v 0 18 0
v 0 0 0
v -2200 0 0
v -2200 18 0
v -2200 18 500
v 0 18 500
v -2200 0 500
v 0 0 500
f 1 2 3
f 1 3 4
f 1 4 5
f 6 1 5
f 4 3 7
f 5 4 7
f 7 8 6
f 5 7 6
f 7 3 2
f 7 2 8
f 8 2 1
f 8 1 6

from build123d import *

# Parameters (mm, degrees)
F0_W     = 43.4928238392
F0_H     = 32.2236791253
F1_DEPTH = 18
F2_DEPTH = 2200
F3_DEPTH = 500


with BuildPart() as f1:
    # F0 (on Front) → F1 (new body)
    with BuildSketch(Plane.XZ):
        with Locations((-21.7464119196, 16.1118395627)):
            Rectangle(F0_W, F0_H)
    extrude(amount=-F1_DEPTH)

    # F2 (add): a face of the model
    f2_faces = [f1.faces().sort_by_distance(p)[0] for p in [
        (0, 9, 16.1118395627),
    ]]
    extrude(f2_faces, amount=-F2_DEPTH)

    # F3 (add): a face of the model
    f3_faces = [f1.faces().sort_by_distance(p)[0] for p in [
        (-1100, 9, 0),
    ]]
    extrude(f3_faces, amount=-F3_DEPTH)


solid = f1.part
